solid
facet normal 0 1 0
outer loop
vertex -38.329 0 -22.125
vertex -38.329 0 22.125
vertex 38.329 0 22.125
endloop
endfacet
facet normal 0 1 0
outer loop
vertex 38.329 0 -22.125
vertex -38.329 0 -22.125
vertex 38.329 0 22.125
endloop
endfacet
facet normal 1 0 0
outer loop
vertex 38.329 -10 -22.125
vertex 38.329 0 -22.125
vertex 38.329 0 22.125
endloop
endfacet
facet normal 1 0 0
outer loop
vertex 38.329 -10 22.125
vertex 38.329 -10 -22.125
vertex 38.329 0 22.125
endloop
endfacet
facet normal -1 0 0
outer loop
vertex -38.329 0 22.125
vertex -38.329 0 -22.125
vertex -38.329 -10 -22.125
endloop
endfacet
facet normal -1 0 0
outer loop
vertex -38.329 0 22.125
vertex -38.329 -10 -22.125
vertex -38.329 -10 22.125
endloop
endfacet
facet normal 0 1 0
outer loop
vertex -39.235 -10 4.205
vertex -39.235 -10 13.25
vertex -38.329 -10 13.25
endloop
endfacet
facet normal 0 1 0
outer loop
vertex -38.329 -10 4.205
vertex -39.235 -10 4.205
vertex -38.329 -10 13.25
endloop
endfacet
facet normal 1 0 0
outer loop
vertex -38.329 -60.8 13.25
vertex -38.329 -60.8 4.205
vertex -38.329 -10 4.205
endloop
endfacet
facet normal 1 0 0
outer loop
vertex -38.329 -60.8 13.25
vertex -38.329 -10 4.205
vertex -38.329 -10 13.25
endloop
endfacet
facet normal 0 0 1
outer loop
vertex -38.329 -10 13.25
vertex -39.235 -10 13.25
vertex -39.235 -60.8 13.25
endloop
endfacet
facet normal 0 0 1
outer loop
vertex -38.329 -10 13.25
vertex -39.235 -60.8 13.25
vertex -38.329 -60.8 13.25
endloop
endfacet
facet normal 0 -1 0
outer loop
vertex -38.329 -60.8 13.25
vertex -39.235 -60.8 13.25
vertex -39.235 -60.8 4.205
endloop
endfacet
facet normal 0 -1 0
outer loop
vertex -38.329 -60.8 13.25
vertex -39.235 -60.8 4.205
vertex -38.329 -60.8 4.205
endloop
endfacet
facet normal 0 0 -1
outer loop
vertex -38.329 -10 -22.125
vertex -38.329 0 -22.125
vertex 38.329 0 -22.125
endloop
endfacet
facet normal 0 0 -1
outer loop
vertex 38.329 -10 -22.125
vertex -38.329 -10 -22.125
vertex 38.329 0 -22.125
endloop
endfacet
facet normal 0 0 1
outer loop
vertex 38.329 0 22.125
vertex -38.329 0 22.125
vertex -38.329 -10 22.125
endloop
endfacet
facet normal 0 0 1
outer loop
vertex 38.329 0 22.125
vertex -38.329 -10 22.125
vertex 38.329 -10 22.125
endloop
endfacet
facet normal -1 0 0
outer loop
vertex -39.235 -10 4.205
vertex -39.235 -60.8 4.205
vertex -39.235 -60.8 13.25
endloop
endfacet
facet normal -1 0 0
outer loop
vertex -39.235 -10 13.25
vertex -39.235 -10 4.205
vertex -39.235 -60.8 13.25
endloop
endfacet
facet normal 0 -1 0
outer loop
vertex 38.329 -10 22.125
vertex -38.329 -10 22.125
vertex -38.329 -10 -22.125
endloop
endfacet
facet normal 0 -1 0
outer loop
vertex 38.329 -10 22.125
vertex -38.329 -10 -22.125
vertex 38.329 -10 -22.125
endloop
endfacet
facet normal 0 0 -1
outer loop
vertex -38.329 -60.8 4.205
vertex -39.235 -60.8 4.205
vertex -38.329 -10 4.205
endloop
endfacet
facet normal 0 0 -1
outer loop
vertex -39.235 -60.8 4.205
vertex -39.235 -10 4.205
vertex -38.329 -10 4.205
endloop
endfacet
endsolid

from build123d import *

# Parameters (mm, degrees)
F0_W     = 76.6580477357
F0_H     = 44.2494452
F1_DEPTH = 10
F2_W     = 0.9057503194
F2_H     = 9.0445876122
F3_DEPTH = 25.4
F4_DEPTH = 25.4


with BuildPart() as f1:
    # F0 (on Front) → F1 (new body)
    with BuildSketch(Plane.XZ):
        Rectangle(F0_W, F0_H)
    extrude(amount=F1_DEPTH)


with BuildPart() as f3:
    # F2 (on face) → F3 (new body)
    with BuildSketch(Plane.XZ.offset(10)):
        with Locations((-38.7818990275, 8.7276399136)):
            Rectangle(F2_W, F2_H)
    extrude(amount=F3_DEPTH)

    # F4 (add): a face of the model
    f4_faces = [f3.faces().sort_by_distance(p)[0] for p in [
        (-38.7818990275, -35.4, 8.7276399136),
    ]]
    extrude(f4_faces, amount=F4_DEPTH)


solid = Compound([f1.part, f3.part])
